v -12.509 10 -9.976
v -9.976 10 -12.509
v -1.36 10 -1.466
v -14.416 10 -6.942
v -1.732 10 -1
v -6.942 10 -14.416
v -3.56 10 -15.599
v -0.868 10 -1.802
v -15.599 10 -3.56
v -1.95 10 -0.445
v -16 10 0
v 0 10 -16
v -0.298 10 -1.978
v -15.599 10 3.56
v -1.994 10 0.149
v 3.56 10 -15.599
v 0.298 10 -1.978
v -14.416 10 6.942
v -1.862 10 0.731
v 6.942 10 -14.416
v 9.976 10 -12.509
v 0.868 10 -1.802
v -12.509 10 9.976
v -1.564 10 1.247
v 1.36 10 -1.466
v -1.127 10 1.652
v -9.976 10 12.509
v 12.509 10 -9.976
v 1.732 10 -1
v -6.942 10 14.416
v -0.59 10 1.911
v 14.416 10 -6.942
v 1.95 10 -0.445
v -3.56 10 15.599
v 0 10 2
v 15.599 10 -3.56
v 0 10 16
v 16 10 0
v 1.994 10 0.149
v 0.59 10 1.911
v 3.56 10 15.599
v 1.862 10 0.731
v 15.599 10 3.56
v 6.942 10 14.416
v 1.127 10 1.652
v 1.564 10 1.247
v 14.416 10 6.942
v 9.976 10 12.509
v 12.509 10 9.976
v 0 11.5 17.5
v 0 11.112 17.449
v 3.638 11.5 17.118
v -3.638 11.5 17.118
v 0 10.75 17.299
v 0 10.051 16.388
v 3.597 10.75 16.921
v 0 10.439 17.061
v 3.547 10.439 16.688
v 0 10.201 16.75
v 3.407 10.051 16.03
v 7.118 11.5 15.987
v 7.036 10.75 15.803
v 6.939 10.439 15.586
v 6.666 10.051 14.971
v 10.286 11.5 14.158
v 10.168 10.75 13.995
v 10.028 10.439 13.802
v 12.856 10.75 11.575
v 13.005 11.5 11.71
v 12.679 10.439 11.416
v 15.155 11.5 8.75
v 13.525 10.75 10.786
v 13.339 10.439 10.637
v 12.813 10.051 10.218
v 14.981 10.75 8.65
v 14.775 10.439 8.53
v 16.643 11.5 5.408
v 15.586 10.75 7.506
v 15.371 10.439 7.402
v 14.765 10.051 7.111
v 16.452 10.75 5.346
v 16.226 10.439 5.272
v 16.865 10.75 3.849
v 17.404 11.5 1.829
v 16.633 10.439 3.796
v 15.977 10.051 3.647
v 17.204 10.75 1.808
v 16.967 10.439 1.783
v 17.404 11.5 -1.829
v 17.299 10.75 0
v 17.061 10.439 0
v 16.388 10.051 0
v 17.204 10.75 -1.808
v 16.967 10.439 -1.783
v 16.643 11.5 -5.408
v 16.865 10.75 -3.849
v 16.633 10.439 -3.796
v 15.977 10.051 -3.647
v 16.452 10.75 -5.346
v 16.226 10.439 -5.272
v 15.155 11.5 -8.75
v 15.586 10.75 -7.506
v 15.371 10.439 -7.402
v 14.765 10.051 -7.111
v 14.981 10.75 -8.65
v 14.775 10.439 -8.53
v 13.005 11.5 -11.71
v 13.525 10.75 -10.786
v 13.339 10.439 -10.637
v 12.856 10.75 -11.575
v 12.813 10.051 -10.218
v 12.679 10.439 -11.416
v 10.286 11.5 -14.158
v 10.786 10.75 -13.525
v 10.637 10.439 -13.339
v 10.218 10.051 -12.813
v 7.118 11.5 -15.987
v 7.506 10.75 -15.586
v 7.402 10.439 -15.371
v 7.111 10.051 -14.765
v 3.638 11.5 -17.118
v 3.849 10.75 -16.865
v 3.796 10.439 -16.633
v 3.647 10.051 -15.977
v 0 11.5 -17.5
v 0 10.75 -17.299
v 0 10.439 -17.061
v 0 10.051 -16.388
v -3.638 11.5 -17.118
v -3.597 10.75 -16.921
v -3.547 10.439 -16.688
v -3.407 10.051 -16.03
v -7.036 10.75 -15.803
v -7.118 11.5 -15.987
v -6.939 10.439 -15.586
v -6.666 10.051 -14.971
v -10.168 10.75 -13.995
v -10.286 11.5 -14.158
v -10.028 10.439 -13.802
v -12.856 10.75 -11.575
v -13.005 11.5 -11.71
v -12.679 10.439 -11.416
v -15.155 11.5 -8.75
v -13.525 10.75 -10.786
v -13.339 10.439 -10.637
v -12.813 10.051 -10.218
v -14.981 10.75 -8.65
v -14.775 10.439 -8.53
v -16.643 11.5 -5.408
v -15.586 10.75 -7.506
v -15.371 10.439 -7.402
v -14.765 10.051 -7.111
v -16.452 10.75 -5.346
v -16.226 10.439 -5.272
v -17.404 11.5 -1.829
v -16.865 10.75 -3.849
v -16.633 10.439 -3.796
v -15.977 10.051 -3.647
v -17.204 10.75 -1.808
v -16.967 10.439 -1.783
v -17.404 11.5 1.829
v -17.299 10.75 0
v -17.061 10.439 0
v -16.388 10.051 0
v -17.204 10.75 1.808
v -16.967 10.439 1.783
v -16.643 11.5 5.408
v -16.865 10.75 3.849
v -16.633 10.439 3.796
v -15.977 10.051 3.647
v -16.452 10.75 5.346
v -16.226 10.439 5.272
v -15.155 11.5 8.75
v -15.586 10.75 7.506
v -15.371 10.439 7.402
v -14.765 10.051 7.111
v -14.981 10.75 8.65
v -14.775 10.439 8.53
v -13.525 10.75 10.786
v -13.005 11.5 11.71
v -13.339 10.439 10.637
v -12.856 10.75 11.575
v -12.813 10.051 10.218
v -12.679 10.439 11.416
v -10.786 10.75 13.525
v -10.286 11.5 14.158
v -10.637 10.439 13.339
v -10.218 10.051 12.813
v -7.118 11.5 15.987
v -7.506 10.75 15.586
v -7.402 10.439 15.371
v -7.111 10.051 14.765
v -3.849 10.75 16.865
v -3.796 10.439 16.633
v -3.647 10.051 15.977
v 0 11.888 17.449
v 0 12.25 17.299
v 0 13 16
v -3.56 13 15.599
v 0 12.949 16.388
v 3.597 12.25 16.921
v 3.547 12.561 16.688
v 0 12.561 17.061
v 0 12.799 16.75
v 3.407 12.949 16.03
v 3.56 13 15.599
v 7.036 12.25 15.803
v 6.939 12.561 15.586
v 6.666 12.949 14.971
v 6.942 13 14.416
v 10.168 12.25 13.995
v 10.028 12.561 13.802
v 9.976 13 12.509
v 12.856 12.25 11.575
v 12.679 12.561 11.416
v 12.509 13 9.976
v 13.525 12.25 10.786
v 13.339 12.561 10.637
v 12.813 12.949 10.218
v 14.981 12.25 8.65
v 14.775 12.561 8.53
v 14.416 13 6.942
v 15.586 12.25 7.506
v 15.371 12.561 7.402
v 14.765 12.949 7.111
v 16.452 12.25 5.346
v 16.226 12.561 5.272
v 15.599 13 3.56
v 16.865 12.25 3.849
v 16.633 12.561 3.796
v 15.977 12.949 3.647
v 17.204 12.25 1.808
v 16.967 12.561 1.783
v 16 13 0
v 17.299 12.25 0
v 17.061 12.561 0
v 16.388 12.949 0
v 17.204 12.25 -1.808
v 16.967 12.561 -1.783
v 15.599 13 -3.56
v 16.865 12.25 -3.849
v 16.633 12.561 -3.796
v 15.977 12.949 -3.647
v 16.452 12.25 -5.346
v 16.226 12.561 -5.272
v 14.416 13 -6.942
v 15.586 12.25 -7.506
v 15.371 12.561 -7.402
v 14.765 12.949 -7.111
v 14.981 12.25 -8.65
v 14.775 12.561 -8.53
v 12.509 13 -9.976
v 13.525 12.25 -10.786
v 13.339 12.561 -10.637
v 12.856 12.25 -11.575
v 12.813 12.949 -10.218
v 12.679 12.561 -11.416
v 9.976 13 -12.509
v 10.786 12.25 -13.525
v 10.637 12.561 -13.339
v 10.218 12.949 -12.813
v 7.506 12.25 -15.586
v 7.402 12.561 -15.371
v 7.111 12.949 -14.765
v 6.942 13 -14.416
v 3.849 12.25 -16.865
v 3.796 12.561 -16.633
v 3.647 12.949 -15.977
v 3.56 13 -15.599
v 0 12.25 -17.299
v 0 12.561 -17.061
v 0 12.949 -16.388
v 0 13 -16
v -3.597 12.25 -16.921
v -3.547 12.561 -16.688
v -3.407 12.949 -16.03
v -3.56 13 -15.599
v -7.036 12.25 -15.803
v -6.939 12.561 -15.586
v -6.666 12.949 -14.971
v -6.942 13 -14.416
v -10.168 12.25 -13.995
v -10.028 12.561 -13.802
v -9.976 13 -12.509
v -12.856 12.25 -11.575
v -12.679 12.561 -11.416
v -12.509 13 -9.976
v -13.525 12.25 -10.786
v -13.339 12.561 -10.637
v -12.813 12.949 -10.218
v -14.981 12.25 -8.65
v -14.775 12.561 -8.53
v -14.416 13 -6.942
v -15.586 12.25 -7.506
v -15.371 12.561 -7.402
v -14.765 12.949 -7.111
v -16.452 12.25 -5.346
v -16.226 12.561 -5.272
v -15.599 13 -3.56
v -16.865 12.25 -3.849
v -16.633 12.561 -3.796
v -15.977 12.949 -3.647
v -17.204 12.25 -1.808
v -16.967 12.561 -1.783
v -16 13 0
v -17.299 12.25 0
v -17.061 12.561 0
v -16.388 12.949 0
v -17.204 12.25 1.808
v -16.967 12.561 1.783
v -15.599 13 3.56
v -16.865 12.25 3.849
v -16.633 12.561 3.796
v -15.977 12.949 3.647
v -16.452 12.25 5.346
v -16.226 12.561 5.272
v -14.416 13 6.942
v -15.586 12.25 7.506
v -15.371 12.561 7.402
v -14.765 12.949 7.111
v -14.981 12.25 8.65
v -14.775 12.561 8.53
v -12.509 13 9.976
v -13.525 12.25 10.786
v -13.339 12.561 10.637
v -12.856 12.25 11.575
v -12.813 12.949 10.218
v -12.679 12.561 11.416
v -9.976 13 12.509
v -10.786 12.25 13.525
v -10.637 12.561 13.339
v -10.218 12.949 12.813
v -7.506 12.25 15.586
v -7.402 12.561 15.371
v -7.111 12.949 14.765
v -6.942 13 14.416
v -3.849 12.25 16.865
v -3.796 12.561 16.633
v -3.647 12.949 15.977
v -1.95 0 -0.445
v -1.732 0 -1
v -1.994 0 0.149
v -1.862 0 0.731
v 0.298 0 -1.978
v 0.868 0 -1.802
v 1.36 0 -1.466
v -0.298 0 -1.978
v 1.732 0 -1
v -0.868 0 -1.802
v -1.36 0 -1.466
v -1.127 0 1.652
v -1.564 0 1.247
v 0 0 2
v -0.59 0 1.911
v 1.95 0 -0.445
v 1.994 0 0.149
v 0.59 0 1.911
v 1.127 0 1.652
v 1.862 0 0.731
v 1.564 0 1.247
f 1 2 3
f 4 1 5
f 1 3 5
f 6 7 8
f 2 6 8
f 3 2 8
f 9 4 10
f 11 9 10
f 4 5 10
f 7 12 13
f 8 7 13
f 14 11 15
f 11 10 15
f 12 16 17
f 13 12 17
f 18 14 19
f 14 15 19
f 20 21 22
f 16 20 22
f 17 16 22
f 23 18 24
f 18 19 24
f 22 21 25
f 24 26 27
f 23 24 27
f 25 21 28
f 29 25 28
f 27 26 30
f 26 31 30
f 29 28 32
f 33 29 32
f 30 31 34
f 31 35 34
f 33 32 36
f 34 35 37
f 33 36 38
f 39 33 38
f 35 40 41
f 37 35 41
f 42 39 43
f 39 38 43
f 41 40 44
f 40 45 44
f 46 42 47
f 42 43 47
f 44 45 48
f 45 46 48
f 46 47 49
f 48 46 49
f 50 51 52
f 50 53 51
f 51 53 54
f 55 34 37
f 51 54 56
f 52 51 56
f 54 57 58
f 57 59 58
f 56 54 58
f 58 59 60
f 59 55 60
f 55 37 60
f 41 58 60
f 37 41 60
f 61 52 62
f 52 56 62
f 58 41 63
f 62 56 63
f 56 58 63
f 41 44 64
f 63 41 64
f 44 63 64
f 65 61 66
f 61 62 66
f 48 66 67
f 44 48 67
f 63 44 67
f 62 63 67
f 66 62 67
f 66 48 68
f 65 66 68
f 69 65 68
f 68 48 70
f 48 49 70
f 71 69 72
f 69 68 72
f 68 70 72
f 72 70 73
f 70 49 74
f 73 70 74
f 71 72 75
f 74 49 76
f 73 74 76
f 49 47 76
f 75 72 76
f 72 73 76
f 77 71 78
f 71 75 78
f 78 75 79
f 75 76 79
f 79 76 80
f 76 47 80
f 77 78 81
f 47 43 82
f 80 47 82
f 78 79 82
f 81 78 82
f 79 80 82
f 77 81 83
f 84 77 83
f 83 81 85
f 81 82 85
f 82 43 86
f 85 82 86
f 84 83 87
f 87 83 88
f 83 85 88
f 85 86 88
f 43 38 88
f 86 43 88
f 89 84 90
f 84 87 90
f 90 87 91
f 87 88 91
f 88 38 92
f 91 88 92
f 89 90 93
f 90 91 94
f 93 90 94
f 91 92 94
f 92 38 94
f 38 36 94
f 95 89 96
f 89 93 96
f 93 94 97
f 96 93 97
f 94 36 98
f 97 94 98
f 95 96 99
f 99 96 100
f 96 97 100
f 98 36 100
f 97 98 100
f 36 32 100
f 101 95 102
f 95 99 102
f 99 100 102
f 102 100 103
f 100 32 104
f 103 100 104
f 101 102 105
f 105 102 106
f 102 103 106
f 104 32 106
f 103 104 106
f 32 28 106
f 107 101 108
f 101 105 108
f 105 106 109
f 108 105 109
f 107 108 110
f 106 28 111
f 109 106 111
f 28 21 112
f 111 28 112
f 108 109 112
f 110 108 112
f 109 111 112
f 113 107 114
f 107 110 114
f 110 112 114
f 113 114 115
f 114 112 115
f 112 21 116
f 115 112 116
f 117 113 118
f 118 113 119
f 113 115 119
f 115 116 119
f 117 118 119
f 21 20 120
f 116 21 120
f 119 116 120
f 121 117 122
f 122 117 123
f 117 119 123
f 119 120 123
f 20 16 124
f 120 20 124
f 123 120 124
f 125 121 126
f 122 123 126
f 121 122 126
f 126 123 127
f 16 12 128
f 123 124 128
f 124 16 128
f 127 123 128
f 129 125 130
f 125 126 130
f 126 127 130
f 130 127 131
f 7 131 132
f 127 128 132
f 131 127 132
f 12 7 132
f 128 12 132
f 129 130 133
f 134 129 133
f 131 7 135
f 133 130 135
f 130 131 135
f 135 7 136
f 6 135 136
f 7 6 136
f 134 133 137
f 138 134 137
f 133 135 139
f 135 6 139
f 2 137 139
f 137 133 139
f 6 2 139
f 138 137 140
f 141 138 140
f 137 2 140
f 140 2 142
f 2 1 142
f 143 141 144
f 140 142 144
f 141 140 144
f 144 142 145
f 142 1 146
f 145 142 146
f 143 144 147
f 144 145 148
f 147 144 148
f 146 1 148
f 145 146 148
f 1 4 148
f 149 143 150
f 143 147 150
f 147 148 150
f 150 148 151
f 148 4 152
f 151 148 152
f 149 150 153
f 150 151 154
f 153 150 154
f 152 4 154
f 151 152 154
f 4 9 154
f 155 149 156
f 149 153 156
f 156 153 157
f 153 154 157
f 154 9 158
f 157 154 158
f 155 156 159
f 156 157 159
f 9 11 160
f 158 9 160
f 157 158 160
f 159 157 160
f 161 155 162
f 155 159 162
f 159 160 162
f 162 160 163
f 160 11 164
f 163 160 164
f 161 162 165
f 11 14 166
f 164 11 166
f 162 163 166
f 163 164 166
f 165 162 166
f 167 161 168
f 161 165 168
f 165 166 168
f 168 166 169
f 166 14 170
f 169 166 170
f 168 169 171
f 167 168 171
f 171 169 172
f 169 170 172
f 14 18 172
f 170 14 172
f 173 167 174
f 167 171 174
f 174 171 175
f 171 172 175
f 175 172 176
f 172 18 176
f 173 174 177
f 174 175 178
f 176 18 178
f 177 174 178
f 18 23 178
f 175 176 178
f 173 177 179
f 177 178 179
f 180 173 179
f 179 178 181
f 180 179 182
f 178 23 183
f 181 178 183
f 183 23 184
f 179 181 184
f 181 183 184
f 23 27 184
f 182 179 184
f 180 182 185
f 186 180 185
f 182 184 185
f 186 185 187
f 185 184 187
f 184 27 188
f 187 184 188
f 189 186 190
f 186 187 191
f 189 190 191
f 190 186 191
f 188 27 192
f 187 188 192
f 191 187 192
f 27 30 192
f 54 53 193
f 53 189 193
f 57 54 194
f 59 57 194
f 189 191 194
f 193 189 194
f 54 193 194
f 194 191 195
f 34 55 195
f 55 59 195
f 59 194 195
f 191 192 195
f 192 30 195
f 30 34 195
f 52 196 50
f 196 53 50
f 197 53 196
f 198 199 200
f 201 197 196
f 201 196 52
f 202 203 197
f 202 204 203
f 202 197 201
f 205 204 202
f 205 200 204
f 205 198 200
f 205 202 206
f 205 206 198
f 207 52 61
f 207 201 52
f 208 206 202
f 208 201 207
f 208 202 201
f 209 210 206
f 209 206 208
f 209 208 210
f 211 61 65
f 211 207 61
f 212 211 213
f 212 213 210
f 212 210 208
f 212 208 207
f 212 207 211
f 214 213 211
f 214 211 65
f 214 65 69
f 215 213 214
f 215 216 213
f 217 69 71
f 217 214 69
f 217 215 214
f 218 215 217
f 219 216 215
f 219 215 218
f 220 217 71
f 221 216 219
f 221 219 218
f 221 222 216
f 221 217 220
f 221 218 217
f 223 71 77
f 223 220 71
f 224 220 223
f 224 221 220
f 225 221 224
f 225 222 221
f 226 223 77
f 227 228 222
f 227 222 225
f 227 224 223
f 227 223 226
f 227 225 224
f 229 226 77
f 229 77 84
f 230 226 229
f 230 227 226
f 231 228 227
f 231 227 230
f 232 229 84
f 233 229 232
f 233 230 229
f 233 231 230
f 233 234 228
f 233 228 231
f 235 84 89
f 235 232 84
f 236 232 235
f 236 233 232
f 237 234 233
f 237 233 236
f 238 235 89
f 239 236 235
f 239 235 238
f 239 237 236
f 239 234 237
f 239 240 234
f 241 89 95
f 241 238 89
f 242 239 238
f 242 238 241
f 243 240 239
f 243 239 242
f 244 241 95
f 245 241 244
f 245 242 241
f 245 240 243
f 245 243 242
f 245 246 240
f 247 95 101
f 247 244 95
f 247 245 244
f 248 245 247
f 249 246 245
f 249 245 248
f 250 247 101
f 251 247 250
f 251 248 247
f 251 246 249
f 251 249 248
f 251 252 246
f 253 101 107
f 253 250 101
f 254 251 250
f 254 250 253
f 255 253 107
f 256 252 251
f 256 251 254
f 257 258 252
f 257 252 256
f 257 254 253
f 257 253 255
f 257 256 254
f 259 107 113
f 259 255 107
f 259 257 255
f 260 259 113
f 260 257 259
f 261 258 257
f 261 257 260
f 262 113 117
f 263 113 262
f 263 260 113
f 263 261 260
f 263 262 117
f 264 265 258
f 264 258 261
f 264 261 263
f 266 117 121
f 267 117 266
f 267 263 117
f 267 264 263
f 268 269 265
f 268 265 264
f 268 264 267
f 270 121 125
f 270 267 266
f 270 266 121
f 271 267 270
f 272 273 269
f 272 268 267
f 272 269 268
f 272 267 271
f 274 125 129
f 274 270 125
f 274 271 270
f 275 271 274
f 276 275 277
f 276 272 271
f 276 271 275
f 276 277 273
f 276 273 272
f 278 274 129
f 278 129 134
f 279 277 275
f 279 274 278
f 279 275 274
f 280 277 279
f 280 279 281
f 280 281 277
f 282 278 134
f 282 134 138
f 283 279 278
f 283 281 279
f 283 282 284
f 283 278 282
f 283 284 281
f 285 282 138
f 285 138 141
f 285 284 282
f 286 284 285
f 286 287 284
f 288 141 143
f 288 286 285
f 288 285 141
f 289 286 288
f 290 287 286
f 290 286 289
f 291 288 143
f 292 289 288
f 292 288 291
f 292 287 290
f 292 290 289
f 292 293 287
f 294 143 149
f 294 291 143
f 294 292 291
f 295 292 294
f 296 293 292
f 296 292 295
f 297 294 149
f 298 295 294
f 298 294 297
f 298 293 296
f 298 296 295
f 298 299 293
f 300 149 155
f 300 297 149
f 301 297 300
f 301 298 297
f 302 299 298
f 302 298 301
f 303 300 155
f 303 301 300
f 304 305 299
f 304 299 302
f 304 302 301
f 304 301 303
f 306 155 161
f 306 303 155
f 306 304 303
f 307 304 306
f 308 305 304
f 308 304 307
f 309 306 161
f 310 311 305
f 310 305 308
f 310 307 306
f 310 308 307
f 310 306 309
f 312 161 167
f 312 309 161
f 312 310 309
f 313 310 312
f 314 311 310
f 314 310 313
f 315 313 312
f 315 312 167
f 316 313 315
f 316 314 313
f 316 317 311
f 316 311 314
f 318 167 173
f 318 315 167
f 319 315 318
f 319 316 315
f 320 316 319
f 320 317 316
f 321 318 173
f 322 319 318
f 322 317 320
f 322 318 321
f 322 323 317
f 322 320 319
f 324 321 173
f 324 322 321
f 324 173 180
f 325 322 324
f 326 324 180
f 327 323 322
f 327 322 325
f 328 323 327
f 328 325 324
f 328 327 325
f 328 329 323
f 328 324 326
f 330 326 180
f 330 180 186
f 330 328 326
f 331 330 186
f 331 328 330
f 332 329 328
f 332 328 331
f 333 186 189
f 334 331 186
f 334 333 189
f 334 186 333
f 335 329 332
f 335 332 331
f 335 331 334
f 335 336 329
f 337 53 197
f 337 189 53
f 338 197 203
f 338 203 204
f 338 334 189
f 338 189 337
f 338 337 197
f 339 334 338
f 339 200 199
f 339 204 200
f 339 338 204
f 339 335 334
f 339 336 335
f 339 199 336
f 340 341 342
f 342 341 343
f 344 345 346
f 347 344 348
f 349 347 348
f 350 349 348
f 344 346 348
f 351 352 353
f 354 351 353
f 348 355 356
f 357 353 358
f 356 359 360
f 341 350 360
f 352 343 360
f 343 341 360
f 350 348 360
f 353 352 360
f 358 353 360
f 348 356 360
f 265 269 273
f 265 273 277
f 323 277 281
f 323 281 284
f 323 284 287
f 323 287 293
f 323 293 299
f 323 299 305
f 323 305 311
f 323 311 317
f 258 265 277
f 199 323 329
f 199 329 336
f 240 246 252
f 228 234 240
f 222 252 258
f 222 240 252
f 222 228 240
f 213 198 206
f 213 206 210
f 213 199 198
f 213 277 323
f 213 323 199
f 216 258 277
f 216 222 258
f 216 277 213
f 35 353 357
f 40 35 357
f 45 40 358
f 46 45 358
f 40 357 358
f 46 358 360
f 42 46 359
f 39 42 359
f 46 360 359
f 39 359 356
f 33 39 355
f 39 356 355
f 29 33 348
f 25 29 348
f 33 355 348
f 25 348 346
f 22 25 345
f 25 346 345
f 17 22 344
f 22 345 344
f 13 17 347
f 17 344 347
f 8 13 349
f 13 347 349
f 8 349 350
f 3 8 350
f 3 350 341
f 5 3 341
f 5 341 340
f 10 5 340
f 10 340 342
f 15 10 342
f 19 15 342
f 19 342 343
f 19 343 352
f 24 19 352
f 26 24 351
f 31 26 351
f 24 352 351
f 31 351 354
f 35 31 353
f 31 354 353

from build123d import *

# Parameters (mm, degrees)
SKETCH1_R           = 2
BOSS_EXTRUDE1_DEPTH = 10
SKETCH2_R           = 17.5
BOSS_EXTRUDE2_DEPTH = 3
FILLET1_R           = 1.5


with BuildPart() as part:
    # Sketch1 → Boss-Extrude1 (new body)
    with BuildSketch(Plane(origin=(0, 0, 0), x_dir=(1, 0, 0), z_dir=(0, 1, 0))):
        with Locations(Location((0, 0, 0), (0, 0, 270))):
            Circle(SKETCH1_R)
    extrude(amount=BOSS_EXTRUDE1_DEPTH)

    # Sketch2 → Boss-Extrude2 (add)
    with BuildSketch(Plane(origin=(0, 10, 0), x_dir=(1, 0, 0), z_dir=(0, 1, 0))):
        with Locations(Location((0, 0, 0), (0, 0, 270))):
            Circle(SKETCH2_R)
    extrude(amount=BOSS_EXTRUDE2_DEPTH)

    # Fillet1
    fillet1_edges = [part.edges().sort_by_distance(p)[0] for p in [
        (0, 10, -17.5),
        (0, 13, -17.5),
    ]]
    fillet(fillet1_edges, radius=FILLET1_R - 0.0001)  # a hair under: the kernel refuses the full size


solid = part.part
